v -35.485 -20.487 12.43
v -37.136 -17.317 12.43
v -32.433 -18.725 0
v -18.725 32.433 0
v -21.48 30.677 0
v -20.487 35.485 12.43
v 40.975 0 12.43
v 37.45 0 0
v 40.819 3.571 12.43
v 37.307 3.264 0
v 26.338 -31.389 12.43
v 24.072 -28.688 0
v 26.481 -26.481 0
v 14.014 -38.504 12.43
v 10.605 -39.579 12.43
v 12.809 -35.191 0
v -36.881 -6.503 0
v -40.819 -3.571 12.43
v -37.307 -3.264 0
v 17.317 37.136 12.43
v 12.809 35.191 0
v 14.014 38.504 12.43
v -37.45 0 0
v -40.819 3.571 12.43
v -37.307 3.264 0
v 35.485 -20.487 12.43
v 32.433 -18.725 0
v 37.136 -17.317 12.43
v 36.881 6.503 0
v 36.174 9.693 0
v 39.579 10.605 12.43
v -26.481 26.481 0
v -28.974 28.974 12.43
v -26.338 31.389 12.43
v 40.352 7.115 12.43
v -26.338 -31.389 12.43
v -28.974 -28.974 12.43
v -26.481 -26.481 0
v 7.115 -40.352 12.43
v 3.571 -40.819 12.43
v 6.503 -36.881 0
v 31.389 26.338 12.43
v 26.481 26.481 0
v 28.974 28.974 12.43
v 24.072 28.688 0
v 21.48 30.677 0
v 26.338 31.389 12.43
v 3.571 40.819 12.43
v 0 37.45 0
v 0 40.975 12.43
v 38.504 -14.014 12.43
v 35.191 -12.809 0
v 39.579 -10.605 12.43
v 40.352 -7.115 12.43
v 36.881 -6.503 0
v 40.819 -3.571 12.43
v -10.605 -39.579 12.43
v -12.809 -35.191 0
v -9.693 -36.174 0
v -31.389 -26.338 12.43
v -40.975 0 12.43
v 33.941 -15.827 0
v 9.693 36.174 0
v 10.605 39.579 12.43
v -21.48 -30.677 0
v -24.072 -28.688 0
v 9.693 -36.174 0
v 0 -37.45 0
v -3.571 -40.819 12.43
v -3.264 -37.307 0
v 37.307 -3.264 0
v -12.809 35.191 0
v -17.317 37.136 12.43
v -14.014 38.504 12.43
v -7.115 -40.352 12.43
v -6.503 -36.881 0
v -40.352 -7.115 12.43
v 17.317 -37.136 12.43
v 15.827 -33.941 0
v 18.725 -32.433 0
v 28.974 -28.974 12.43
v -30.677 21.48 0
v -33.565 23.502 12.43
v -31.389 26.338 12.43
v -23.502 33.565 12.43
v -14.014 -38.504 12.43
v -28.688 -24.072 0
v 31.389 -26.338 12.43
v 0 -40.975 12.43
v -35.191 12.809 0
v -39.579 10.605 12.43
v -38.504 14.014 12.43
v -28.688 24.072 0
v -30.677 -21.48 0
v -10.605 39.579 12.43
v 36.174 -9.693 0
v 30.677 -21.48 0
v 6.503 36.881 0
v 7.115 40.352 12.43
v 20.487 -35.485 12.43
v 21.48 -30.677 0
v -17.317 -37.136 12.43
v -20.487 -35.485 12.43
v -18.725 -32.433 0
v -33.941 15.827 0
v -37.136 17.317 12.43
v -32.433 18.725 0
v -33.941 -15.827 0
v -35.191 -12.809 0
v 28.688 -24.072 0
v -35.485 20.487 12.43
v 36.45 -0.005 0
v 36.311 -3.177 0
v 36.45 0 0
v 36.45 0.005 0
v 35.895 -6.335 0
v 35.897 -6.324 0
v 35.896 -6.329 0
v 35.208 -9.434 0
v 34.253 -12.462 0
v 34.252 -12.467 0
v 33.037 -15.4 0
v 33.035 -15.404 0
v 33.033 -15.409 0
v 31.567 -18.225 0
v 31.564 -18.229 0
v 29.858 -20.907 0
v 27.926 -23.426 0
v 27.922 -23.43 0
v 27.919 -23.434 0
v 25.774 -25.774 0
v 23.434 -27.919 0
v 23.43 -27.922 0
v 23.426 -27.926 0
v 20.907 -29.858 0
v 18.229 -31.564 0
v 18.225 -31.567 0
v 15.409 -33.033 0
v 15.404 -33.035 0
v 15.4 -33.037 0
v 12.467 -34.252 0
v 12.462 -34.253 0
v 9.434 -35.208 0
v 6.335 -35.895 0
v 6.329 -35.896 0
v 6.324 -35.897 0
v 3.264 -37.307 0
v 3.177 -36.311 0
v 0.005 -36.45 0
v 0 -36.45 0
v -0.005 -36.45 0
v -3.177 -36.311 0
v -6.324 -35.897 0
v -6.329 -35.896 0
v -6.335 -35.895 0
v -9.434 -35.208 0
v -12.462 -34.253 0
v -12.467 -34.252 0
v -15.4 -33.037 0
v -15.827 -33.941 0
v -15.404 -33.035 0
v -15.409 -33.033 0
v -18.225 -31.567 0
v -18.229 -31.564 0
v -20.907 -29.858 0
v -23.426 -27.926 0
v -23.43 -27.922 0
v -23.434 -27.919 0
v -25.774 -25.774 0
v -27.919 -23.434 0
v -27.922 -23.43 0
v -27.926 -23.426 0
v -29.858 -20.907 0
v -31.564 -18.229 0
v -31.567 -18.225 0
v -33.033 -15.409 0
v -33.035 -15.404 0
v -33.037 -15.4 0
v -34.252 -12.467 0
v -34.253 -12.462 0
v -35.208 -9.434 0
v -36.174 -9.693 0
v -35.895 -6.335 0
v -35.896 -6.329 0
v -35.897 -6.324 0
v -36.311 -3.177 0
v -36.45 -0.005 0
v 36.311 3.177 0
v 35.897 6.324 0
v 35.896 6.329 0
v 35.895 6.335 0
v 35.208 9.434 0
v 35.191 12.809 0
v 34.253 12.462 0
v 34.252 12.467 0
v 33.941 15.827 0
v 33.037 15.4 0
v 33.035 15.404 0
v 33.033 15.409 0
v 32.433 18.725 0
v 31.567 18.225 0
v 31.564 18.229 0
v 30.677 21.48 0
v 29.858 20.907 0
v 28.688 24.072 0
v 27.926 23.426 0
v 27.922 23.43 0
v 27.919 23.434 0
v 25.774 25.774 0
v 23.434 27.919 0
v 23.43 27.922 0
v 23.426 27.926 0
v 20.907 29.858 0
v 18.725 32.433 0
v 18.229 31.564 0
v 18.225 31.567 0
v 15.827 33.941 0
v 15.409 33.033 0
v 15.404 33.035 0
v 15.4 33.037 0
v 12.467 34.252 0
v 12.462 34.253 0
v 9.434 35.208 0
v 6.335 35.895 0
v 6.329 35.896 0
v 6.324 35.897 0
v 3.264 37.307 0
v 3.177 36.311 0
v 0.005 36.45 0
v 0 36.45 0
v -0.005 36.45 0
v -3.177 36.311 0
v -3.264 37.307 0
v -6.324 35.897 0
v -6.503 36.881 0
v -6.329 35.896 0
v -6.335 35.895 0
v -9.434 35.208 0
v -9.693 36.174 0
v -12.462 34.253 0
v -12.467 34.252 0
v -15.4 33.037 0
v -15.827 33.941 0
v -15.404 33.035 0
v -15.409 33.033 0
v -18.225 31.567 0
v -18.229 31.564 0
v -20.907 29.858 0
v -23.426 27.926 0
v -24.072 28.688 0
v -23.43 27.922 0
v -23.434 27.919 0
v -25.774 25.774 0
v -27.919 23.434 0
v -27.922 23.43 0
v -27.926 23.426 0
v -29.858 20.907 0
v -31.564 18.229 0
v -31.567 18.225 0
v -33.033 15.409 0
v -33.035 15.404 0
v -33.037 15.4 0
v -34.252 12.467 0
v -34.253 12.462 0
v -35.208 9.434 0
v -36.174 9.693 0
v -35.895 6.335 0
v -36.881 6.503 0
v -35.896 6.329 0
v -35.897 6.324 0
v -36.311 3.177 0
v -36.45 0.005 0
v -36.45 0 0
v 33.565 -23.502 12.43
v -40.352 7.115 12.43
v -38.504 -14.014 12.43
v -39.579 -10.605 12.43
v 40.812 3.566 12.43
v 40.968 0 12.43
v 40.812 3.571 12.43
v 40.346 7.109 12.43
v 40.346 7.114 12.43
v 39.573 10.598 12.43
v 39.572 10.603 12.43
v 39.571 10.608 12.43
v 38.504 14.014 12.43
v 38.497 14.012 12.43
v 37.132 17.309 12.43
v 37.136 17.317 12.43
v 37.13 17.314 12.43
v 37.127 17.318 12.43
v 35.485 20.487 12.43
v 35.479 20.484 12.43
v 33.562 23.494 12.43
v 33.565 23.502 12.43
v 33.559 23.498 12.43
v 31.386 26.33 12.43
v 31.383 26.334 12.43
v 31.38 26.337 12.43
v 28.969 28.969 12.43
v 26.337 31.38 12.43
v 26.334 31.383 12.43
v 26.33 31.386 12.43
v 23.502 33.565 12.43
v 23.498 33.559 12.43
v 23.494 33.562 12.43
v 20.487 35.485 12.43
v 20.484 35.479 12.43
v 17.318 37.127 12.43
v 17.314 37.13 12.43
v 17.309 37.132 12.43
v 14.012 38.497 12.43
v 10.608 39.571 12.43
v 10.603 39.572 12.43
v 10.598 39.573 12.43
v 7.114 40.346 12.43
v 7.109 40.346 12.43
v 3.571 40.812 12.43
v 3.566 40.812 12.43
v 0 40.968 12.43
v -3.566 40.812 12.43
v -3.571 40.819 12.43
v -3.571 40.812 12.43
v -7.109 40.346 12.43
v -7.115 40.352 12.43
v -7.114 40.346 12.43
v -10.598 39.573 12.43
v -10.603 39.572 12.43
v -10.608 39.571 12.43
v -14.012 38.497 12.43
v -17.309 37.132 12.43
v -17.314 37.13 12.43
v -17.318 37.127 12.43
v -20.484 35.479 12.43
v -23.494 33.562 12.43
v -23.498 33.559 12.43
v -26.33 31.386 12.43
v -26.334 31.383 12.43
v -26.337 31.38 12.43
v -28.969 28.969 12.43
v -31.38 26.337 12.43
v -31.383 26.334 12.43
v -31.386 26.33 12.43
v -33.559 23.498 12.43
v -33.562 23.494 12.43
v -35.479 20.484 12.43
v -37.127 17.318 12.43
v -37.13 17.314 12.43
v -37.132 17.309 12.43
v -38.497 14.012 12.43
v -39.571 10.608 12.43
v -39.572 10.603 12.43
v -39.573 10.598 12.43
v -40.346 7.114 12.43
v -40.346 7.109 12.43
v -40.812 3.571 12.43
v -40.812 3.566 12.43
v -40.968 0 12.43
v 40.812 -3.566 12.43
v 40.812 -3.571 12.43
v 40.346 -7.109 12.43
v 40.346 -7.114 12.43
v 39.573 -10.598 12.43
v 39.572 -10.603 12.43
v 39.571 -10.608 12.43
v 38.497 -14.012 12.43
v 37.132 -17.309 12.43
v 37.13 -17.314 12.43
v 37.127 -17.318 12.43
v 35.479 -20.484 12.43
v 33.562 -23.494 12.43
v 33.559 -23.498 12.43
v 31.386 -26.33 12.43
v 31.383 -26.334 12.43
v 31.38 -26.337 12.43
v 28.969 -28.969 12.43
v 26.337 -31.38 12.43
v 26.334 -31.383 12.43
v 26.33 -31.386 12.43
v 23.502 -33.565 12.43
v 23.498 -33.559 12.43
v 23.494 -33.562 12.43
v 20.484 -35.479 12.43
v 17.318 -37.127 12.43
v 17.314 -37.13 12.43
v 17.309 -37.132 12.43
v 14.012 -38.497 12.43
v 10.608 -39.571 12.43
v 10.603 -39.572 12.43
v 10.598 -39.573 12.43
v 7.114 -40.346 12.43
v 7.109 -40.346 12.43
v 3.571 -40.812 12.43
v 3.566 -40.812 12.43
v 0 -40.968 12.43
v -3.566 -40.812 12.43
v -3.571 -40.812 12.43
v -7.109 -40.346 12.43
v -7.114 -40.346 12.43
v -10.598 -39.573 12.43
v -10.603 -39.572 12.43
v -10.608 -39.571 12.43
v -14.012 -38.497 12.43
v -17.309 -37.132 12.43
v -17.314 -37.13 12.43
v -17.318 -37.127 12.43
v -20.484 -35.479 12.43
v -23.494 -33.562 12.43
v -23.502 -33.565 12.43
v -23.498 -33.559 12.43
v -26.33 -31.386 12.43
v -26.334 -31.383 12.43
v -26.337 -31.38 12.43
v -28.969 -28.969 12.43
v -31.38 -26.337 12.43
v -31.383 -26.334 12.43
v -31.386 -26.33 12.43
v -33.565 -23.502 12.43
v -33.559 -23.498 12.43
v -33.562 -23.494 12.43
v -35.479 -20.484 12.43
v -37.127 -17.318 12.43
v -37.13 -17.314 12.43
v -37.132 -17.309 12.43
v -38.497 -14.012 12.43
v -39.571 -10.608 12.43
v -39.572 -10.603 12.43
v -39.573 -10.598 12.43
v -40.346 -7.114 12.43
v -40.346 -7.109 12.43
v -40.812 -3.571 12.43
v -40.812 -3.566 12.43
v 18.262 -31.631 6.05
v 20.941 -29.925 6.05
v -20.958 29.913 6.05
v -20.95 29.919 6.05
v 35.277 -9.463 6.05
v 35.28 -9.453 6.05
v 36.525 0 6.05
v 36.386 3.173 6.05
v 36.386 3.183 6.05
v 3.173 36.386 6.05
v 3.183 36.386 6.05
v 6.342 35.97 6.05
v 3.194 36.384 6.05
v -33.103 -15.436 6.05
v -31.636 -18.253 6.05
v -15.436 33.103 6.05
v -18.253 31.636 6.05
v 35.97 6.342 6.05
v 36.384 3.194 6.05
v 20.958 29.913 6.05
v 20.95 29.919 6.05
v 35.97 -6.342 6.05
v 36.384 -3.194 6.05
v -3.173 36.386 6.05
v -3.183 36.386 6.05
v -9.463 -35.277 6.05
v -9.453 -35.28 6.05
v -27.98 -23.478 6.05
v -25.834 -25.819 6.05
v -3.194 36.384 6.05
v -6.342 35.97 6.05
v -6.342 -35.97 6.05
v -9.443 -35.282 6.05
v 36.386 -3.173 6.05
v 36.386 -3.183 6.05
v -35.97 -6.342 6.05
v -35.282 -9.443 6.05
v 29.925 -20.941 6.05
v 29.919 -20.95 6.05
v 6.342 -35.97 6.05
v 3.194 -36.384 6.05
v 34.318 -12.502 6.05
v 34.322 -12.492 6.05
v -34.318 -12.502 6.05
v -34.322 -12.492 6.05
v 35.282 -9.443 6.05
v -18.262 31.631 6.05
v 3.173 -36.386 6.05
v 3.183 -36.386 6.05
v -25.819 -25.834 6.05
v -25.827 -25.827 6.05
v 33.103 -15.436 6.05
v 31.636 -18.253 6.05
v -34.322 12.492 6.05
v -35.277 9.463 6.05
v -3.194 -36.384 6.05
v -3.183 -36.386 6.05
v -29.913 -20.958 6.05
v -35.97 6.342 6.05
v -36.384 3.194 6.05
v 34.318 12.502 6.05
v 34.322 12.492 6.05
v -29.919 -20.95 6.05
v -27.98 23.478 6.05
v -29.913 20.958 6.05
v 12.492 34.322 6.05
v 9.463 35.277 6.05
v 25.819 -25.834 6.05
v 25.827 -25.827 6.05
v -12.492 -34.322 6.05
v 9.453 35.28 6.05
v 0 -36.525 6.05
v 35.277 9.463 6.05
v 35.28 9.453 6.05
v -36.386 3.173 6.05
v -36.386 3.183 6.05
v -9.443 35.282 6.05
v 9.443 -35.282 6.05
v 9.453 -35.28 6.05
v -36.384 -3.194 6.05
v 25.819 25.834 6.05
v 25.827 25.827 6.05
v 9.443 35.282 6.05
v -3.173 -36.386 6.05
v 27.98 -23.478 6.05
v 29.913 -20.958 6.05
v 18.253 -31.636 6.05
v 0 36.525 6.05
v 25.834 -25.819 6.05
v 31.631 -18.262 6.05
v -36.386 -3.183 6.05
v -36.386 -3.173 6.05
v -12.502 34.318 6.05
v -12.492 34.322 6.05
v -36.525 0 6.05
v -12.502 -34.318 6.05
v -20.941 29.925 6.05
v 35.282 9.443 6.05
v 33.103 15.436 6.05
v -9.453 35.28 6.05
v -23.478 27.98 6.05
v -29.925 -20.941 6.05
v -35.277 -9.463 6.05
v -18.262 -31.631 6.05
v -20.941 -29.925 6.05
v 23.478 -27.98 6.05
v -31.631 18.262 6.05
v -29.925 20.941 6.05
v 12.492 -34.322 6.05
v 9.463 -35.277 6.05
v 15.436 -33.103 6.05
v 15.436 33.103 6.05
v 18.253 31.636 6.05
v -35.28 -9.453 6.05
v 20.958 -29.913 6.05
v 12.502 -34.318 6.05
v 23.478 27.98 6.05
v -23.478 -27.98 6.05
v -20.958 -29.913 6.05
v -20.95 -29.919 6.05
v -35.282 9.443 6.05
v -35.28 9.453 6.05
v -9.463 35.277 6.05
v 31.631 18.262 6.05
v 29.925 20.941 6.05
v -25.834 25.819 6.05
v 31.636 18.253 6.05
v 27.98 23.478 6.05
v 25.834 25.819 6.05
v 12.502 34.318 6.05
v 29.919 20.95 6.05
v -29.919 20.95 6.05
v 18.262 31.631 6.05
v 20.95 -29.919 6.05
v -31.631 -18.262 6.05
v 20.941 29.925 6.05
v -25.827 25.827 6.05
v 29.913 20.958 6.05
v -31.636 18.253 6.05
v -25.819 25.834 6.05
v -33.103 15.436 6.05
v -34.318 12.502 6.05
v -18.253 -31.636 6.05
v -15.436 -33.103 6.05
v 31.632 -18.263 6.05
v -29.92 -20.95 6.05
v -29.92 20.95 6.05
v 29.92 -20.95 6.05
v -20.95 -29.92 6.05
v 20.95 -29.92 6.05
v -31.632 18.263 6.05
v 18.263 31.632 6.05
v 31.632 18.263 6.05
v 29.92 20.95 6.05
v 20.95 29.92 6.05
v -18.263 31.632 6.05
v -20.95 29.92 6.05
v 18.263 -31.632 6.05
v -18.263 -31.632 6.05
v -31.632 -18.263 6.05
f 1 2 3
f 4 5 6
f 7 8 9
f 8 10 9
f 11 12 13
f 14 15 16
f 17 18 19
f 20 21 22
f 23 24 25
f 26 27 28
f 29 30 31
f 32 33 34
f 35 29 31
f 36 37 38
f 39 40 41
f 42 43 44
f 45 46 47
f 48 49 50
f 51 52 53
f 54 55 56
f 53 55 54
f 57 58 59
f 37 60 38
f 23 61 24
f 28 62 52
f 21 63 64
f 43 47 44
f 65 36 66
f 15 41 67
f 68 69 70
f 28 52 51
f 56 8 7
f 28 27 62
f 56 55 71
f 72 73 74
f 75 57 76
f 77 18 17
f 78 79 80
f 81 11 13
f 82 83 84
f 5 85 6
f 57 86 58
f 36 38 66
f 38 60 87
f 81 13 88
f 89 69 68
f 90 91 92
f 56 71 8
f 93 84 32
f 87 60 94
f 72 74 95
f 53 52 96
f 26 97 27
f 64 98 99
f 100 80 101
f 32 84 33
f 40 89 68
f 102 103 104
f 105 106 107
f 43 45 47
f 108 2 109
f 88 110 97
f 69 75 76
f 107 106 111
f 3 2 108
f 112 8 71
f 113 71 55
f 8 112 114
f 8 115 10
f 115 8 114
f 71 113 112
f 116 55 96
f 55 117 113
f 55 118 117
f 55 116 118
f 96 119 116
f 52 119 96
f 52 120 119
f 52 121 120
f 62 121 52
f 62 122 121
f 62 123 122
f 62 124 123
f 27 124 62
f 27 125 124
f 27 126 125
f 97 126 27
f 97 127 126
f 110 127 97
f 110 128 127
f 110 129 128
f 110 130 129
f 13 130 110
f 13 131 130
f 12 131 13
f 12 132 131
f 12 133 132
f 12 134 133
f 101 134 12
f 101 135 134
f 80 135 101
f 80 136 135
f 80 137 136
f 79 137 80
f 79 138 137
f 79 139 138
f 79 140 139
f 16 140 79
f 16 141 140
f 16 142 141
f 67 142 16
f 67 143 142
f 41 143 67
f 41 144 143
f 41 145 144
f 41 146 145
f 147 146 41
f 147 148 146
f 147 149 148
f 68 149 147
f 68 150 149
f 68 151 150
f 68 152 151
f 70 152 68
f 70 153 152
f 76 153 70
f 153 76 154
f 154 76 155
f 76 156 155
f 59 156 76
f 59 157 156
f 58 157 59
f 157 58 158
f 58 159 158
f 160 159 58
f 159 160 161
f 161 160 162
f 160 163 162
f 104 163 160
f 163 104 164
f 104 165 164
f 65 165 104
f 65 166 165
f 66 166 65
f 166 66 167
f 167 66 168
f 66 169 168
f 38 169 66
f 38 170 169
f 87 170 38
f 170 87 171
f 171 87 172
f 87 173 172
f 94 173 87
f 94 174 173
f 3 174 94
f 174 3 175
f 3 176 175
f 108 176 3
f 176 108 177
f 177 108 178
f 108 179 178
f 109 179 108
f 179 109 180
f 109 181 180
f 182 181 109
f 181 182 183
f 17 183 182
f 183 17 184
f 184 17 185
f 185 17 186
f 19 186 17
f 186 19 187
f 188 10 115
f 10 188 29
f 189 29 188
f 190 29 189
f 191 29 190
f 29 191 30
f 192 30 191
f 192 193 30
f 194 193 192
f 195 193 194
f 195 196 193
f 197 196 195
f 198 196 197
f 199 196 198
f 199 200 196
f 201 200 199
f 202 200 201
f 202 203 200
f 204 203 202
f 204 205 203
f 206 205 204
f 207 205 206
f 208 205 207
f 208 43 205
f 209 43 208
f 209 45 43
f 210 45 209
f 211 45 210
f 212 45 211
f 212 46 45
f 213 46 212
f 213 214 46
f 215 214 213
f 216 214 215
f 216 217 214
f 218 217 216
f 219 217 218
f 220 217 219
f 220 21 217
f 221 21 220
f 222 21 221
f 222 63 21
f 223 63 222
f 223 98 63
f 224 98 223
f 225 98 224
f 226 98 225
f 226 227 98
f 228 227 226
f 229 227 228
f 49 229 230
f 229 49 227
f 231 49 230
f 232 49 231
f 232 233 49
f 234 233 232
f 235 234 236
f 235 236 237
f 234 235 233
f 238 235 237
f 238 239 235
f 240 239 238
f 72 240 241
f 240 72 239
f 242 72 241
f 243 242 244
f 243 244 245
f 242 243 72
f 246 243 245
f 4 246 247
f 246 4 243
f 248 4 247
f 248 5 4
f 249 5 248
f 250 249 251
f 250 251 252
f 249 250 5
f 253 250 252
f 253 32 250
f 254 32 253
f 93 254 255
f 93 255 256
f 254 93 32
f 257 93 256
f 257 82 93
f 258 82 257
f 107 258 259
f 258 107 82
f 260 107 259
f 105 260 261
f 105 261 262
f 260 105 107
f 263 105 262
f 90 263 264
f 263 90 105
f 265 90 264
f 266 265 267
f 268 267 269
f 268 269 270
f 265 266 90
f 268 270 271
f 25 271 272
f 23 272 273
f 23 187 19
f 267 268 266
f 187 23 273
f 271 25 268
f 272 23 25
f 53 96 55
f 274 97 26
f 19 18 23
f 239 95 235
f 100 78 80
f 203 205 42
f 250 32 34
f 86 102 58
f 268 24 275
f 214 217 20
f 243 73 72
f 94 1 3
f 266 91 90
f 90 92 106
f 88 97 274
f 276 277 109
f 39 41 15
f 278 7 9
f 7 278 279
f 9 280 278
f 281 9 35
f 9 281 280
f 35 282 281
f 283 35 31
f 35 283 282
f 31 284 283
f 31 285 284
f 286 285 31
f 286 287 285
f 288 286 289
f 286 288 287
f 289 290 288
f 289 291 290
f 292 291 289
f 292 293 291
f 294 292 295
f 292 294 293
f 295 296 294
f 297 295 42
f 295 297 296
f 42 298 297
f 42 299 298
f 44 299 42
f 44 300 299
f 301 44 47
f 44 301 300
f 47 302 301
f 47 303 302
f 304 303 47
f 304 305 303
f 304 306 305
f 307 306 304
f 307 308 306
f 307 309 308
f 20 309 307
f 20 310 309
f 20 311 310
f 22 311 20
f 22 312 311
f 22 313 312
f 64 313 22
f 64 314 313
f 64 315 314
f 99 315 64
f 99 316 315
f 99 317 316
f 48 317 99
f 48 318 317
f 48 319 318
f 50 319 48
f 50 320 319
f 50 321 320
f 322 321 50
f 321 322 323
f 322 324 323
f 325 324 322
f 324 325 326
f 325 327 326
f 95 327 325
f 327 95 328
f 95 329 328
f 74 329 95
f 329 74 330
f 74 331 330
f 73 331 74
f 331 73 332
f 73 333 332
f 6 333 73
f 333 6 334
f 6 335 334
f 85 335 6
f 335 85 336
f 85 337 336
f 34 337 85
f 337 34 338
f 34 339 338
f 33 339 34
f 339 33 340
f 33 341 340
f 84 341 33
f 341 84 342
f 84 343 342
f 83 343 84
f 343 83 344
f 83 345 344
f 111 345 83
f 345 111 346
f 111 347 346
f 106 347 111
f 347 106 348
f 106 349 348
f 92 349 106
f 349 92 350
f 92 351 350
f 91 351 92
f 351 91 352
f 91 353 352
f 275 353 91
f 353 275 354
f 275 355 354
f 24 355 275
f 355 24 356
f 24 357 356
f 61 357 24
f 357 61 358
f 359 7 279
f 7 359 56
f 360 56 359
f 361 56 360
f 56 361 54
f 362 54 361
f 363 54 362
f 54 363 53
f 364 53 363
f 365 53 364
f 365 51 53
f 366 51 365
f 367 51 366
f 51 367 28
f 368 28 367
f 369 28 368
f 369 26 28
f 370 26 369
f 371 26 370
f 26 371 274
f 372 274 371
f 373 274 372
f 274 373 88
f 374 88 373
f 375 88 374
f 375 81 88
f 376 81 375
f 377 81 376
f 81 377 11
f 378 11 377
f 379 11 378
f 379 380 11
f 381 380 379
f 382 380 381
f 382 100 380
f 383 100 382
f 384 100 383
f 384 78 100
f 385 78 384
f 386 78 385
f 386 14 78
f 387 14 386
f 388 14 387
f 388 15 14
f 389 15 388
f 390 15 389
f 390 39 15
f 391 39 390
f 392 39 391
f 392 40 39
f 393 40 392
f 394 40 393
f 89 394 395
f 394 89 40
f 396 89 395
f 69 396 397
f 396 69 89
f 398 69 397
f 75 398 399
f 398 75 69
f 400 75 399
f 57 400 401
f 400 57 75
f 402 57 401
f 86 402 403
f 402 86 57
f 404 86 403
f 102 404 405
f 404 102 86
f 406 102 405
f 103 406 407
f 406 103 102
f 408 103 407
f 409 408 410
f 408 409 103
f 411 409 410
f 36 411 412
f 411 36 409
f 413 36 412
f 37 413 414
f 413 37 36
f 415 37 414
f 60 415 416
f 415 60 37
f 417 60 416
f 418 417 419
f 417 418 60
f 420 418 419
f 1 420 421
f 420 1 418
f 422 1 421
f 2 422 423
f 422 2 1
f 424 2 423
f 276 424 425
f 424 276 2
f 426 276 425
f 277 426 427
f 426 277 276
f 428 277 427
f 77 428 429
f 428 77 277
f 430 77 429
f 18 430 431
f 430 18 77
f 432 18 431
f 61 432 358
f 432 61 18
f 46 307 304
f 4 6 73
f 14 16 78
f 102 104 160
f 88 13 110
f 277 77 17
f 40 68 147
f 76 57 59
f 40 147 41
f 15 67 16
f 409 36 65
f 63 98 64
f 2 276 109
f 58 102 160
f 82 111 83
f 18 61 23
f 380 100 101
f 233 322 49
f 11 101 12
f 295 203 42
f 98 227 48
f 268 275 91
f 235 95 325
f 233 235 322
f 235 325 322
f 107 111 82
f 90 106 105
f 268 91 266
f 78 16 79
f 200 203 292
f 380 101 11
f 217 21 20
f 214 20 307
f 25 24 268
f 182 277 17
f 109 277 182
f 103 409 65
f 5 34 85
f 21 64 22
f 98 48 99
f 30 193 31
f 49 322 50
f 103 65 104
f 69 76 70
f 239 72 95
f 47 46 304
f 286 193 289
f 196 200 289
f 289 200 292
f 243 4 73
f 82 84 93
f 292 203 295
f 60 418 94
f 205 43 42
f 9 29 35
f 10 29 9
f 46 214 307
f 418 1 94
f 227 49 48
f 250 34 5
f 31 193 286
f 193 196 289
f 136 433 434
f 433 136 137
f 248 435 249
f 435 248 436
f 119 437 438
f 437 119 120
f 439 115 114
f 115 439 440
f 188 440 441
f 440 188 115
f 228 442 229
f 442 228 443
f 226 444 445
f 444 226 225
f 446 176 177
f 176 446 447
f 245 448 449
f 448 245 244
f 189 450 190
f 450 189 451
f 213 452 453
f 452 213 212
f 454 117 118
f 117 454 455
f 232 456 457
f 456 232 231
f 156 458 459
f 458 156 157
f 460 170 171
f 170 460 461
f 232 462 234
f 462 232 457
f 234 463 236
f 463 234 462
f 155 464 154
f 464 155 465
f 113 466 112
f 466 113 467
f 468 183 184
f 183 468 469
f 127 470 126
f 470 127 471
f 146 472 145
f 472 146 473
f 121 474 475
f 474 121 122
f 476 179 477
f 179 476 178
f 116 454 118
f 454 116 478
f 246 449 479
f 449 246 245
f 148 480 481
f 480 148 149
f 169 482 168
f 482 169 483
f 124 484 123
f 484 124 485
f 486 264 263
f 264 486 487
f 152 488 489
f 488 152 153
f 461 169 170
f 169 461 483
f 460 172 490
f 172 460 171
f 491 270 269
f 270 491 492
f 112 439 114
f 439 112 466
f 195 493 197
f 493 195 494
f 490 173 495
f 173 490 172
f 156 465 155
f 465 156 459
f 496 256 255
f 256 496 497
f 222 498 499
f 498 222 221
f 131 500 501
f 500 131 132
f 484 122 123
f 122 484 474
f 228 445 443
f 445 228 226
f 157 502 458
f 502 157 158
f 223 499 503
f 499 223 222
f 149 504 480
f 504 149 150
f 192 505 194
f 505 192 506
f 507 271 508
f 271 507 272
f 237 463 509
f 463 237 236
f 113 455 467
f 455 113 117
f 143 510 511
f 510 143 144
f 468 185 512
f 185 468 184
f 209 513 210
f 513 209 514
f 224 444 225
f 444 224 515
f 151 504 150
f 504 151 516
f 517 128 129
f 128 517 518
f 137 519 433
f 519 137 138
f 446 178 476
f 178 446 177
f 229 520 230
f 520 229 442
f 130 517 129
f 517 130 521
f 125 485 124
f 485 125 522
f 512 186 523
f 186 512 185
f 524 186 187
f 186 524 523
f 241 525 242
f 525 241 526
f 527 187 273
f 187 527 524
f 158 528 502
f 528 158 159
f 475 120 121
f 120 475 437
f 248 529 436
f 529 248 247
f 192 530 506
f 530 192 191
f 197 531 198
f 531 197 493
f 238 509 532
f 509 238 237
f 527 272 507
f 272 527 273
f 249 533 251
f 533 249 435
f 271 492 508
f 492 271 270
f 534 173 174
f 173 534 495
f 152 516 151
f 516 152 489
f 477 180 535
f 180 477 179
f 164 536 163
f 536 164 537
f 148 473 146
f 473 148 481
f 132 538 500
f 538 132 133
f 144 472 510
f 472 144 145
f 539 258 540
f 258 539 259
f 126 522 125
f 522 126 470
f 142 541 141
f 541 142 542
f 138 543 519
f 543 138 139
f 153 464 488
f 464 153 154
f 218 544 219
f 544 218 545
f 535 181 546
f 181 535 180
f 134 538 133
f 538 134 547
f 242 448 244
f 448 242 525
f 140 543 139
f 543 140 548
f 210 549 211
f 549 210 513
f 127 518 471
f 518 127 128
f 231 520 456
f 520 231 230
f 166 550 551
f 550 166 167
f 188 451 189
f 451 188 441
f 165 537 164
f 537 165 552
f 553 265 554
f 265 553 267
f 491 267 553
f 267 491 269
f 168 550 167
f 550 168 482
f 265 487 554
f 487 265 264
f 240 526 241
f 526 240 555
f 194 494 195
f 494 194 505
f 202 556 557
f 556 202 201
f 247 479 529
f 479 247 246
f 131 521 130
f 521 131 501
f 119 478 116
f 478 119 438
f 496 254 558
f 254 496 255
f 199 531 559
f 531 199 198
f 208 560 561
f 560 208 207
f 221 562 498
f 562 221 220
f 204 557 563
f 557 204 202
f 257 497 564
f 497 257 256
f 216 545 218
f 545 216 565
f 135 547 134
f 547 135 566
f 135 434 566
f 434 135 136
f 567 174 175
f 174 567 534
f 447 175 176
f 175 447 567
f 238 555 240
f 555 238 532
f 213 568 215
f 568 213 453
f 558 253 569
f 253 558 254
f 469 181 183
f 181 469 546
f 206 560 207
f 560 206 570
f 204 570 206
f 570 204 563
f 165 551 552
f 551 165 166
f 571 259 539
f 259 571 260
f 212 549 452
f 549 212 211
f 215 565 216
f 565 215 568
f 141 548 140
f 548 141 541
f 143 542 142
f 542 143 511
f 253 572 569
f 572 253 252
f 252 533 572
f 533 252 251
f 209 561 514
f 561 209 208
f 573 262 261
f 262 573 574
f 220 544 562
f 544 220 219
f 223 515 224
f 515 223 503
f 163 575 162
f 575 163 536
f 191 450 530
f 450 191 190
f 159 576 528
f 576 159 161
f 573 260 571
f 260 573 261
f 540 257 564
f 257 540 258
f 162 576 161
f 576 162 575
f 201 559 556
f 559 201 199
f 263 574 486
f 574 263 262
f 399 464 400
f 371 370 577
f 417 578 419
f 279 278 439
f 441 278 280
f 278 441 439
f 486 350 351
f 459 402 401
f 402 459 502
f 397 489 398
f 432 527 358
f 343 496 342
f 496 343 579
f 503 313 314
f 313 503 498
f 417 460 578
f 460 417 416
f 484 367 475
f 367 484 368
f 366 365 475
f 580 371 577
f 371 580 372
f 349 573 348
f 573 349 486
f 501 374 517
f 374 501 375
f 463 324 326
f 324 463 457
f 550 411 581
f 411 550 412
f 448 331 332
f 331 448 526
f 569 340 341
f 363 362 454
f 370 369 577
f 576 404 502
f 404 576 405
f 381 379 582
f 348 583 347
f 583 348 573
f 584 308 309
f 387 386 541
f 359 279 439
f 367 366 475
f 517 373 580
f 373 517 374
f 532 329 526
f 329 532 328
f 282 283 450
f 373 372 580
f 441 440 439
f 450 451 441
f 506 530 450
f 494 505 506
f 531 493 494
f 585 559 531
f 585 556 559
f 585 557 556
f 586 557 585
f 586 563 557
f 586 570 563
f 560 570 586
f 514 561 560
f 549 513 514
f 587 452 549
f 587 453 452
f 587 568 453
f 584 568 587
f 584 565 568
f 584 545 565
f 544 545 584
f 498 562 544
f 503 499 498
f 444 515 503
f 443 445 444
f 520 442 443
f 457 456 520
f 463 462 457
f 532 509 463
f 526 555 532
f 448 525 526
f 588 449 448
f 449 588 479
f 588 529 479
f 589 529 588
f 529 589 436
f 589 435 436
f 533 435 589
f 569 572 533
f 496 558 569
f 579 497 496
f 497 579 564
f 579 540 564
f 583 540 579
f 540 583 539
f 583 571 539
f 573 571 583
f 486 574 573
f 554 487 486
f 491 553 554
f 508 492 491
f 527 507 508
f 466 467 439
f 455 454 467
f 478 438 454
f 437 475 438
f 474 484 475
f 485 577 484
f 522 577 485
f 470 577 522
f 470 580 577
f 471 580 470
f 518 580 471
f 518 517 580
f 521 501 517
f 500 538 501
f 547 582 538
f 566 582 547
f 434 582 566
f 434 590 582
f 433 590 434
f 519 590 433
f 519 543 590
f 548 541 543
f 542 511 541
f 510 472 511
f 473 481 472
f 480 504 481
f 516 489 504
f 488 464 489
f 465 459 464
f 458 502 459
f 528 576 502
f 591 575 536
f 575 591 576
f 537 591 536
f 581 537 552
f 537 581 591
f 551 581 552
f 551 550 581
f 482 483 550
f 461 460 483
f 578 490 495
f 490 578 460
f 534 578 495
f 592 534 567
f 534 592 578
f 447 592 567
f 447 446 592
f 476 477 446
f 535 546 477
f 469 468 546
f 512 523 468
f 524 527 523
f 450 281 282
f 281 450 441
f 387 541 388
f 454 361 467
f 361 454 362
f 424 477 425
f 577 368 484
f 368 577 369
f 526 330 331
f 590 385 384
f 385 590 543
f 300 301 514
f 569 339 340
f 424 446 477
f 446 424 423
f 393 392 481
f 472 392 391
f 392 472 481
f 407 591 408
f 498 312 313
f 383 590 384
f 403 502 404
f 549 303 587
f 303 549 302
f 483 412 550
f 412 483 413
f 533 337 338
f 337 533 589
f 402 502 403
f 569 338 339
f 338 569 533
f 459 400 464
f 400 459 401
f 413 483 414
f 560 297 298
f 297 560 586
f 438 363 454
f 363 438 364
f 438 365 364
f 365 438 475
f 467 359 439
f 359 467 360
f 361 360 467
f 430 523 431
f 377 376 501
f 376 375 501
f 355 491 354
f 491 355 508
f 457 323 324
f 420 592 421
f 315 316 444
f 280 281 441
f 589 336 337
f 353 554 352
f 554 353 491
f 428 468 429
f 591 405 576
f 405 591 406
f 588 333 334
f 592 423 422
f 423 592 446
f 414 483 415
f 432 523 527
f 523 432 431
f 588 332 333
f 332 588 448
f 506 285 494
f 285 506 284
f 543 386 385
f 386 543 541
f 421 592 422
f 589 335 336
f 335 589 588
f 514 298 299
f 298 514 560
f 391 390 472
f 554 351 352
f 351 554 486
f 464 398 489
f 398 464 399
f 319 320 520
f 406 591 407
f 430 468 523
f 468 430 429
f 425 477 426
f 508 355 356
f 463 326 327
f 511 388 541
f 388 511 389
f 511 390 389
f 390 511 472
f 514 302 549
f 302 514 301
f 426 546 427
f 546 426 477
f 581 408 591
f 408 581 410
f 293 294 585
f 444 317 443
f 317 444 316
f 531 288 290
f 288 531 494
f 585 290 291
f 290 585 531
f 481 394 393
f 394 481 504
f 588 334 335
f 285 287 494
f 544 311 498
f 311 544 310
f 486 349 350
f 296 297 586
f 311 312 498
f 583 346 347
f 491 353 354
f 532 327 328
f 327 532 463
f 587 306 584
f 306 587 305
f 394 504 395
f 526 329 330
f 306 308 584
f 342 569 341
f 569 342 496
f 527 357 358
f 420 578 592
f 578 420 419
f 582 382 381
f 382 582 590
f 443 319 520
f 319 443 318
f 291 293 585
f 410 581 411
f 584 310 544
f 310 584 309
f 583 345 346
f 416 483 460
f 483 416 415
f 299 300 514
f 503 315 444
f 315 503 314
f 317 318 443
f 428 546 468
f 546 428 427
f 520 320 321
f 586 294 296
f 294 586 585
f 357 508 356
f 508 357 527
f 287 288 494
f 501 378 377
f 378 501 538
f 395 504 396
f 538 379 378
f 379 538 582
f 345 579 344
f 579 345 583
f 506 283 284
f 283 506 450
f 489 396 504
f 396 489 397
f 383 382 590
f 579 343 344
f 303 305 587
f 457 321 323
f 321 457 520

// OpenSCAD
d1 = 72.5;
d2 = 72.65;
h1 = 6.06;
h2 = 6.37;
d3 = 81.55;
tolerance = 0.2;
wallBottom = 1;

module dummy() {}

ID1 = d1 + 2 * tolerance;
ID2 = d2 + 2 * tolerance;
ID3 = d3 + 2 * tolerance;

OD1 = ID1 + wallBottom * 2;
OD3 = ID3;

nudge = 0.01;

$fn = 72;

difference() {
    cylinder(d1=OD1,d2=OD3,h=h1+h2);
    translate([0,0,-nudge]) cylinder(d1=ID1,d2=ID2,h=h1+2*nudge);
    translate([0,0,h1-nudge]) cylinder(d1=ID2,d2=ID3,h=h2+2*nudge);
}
